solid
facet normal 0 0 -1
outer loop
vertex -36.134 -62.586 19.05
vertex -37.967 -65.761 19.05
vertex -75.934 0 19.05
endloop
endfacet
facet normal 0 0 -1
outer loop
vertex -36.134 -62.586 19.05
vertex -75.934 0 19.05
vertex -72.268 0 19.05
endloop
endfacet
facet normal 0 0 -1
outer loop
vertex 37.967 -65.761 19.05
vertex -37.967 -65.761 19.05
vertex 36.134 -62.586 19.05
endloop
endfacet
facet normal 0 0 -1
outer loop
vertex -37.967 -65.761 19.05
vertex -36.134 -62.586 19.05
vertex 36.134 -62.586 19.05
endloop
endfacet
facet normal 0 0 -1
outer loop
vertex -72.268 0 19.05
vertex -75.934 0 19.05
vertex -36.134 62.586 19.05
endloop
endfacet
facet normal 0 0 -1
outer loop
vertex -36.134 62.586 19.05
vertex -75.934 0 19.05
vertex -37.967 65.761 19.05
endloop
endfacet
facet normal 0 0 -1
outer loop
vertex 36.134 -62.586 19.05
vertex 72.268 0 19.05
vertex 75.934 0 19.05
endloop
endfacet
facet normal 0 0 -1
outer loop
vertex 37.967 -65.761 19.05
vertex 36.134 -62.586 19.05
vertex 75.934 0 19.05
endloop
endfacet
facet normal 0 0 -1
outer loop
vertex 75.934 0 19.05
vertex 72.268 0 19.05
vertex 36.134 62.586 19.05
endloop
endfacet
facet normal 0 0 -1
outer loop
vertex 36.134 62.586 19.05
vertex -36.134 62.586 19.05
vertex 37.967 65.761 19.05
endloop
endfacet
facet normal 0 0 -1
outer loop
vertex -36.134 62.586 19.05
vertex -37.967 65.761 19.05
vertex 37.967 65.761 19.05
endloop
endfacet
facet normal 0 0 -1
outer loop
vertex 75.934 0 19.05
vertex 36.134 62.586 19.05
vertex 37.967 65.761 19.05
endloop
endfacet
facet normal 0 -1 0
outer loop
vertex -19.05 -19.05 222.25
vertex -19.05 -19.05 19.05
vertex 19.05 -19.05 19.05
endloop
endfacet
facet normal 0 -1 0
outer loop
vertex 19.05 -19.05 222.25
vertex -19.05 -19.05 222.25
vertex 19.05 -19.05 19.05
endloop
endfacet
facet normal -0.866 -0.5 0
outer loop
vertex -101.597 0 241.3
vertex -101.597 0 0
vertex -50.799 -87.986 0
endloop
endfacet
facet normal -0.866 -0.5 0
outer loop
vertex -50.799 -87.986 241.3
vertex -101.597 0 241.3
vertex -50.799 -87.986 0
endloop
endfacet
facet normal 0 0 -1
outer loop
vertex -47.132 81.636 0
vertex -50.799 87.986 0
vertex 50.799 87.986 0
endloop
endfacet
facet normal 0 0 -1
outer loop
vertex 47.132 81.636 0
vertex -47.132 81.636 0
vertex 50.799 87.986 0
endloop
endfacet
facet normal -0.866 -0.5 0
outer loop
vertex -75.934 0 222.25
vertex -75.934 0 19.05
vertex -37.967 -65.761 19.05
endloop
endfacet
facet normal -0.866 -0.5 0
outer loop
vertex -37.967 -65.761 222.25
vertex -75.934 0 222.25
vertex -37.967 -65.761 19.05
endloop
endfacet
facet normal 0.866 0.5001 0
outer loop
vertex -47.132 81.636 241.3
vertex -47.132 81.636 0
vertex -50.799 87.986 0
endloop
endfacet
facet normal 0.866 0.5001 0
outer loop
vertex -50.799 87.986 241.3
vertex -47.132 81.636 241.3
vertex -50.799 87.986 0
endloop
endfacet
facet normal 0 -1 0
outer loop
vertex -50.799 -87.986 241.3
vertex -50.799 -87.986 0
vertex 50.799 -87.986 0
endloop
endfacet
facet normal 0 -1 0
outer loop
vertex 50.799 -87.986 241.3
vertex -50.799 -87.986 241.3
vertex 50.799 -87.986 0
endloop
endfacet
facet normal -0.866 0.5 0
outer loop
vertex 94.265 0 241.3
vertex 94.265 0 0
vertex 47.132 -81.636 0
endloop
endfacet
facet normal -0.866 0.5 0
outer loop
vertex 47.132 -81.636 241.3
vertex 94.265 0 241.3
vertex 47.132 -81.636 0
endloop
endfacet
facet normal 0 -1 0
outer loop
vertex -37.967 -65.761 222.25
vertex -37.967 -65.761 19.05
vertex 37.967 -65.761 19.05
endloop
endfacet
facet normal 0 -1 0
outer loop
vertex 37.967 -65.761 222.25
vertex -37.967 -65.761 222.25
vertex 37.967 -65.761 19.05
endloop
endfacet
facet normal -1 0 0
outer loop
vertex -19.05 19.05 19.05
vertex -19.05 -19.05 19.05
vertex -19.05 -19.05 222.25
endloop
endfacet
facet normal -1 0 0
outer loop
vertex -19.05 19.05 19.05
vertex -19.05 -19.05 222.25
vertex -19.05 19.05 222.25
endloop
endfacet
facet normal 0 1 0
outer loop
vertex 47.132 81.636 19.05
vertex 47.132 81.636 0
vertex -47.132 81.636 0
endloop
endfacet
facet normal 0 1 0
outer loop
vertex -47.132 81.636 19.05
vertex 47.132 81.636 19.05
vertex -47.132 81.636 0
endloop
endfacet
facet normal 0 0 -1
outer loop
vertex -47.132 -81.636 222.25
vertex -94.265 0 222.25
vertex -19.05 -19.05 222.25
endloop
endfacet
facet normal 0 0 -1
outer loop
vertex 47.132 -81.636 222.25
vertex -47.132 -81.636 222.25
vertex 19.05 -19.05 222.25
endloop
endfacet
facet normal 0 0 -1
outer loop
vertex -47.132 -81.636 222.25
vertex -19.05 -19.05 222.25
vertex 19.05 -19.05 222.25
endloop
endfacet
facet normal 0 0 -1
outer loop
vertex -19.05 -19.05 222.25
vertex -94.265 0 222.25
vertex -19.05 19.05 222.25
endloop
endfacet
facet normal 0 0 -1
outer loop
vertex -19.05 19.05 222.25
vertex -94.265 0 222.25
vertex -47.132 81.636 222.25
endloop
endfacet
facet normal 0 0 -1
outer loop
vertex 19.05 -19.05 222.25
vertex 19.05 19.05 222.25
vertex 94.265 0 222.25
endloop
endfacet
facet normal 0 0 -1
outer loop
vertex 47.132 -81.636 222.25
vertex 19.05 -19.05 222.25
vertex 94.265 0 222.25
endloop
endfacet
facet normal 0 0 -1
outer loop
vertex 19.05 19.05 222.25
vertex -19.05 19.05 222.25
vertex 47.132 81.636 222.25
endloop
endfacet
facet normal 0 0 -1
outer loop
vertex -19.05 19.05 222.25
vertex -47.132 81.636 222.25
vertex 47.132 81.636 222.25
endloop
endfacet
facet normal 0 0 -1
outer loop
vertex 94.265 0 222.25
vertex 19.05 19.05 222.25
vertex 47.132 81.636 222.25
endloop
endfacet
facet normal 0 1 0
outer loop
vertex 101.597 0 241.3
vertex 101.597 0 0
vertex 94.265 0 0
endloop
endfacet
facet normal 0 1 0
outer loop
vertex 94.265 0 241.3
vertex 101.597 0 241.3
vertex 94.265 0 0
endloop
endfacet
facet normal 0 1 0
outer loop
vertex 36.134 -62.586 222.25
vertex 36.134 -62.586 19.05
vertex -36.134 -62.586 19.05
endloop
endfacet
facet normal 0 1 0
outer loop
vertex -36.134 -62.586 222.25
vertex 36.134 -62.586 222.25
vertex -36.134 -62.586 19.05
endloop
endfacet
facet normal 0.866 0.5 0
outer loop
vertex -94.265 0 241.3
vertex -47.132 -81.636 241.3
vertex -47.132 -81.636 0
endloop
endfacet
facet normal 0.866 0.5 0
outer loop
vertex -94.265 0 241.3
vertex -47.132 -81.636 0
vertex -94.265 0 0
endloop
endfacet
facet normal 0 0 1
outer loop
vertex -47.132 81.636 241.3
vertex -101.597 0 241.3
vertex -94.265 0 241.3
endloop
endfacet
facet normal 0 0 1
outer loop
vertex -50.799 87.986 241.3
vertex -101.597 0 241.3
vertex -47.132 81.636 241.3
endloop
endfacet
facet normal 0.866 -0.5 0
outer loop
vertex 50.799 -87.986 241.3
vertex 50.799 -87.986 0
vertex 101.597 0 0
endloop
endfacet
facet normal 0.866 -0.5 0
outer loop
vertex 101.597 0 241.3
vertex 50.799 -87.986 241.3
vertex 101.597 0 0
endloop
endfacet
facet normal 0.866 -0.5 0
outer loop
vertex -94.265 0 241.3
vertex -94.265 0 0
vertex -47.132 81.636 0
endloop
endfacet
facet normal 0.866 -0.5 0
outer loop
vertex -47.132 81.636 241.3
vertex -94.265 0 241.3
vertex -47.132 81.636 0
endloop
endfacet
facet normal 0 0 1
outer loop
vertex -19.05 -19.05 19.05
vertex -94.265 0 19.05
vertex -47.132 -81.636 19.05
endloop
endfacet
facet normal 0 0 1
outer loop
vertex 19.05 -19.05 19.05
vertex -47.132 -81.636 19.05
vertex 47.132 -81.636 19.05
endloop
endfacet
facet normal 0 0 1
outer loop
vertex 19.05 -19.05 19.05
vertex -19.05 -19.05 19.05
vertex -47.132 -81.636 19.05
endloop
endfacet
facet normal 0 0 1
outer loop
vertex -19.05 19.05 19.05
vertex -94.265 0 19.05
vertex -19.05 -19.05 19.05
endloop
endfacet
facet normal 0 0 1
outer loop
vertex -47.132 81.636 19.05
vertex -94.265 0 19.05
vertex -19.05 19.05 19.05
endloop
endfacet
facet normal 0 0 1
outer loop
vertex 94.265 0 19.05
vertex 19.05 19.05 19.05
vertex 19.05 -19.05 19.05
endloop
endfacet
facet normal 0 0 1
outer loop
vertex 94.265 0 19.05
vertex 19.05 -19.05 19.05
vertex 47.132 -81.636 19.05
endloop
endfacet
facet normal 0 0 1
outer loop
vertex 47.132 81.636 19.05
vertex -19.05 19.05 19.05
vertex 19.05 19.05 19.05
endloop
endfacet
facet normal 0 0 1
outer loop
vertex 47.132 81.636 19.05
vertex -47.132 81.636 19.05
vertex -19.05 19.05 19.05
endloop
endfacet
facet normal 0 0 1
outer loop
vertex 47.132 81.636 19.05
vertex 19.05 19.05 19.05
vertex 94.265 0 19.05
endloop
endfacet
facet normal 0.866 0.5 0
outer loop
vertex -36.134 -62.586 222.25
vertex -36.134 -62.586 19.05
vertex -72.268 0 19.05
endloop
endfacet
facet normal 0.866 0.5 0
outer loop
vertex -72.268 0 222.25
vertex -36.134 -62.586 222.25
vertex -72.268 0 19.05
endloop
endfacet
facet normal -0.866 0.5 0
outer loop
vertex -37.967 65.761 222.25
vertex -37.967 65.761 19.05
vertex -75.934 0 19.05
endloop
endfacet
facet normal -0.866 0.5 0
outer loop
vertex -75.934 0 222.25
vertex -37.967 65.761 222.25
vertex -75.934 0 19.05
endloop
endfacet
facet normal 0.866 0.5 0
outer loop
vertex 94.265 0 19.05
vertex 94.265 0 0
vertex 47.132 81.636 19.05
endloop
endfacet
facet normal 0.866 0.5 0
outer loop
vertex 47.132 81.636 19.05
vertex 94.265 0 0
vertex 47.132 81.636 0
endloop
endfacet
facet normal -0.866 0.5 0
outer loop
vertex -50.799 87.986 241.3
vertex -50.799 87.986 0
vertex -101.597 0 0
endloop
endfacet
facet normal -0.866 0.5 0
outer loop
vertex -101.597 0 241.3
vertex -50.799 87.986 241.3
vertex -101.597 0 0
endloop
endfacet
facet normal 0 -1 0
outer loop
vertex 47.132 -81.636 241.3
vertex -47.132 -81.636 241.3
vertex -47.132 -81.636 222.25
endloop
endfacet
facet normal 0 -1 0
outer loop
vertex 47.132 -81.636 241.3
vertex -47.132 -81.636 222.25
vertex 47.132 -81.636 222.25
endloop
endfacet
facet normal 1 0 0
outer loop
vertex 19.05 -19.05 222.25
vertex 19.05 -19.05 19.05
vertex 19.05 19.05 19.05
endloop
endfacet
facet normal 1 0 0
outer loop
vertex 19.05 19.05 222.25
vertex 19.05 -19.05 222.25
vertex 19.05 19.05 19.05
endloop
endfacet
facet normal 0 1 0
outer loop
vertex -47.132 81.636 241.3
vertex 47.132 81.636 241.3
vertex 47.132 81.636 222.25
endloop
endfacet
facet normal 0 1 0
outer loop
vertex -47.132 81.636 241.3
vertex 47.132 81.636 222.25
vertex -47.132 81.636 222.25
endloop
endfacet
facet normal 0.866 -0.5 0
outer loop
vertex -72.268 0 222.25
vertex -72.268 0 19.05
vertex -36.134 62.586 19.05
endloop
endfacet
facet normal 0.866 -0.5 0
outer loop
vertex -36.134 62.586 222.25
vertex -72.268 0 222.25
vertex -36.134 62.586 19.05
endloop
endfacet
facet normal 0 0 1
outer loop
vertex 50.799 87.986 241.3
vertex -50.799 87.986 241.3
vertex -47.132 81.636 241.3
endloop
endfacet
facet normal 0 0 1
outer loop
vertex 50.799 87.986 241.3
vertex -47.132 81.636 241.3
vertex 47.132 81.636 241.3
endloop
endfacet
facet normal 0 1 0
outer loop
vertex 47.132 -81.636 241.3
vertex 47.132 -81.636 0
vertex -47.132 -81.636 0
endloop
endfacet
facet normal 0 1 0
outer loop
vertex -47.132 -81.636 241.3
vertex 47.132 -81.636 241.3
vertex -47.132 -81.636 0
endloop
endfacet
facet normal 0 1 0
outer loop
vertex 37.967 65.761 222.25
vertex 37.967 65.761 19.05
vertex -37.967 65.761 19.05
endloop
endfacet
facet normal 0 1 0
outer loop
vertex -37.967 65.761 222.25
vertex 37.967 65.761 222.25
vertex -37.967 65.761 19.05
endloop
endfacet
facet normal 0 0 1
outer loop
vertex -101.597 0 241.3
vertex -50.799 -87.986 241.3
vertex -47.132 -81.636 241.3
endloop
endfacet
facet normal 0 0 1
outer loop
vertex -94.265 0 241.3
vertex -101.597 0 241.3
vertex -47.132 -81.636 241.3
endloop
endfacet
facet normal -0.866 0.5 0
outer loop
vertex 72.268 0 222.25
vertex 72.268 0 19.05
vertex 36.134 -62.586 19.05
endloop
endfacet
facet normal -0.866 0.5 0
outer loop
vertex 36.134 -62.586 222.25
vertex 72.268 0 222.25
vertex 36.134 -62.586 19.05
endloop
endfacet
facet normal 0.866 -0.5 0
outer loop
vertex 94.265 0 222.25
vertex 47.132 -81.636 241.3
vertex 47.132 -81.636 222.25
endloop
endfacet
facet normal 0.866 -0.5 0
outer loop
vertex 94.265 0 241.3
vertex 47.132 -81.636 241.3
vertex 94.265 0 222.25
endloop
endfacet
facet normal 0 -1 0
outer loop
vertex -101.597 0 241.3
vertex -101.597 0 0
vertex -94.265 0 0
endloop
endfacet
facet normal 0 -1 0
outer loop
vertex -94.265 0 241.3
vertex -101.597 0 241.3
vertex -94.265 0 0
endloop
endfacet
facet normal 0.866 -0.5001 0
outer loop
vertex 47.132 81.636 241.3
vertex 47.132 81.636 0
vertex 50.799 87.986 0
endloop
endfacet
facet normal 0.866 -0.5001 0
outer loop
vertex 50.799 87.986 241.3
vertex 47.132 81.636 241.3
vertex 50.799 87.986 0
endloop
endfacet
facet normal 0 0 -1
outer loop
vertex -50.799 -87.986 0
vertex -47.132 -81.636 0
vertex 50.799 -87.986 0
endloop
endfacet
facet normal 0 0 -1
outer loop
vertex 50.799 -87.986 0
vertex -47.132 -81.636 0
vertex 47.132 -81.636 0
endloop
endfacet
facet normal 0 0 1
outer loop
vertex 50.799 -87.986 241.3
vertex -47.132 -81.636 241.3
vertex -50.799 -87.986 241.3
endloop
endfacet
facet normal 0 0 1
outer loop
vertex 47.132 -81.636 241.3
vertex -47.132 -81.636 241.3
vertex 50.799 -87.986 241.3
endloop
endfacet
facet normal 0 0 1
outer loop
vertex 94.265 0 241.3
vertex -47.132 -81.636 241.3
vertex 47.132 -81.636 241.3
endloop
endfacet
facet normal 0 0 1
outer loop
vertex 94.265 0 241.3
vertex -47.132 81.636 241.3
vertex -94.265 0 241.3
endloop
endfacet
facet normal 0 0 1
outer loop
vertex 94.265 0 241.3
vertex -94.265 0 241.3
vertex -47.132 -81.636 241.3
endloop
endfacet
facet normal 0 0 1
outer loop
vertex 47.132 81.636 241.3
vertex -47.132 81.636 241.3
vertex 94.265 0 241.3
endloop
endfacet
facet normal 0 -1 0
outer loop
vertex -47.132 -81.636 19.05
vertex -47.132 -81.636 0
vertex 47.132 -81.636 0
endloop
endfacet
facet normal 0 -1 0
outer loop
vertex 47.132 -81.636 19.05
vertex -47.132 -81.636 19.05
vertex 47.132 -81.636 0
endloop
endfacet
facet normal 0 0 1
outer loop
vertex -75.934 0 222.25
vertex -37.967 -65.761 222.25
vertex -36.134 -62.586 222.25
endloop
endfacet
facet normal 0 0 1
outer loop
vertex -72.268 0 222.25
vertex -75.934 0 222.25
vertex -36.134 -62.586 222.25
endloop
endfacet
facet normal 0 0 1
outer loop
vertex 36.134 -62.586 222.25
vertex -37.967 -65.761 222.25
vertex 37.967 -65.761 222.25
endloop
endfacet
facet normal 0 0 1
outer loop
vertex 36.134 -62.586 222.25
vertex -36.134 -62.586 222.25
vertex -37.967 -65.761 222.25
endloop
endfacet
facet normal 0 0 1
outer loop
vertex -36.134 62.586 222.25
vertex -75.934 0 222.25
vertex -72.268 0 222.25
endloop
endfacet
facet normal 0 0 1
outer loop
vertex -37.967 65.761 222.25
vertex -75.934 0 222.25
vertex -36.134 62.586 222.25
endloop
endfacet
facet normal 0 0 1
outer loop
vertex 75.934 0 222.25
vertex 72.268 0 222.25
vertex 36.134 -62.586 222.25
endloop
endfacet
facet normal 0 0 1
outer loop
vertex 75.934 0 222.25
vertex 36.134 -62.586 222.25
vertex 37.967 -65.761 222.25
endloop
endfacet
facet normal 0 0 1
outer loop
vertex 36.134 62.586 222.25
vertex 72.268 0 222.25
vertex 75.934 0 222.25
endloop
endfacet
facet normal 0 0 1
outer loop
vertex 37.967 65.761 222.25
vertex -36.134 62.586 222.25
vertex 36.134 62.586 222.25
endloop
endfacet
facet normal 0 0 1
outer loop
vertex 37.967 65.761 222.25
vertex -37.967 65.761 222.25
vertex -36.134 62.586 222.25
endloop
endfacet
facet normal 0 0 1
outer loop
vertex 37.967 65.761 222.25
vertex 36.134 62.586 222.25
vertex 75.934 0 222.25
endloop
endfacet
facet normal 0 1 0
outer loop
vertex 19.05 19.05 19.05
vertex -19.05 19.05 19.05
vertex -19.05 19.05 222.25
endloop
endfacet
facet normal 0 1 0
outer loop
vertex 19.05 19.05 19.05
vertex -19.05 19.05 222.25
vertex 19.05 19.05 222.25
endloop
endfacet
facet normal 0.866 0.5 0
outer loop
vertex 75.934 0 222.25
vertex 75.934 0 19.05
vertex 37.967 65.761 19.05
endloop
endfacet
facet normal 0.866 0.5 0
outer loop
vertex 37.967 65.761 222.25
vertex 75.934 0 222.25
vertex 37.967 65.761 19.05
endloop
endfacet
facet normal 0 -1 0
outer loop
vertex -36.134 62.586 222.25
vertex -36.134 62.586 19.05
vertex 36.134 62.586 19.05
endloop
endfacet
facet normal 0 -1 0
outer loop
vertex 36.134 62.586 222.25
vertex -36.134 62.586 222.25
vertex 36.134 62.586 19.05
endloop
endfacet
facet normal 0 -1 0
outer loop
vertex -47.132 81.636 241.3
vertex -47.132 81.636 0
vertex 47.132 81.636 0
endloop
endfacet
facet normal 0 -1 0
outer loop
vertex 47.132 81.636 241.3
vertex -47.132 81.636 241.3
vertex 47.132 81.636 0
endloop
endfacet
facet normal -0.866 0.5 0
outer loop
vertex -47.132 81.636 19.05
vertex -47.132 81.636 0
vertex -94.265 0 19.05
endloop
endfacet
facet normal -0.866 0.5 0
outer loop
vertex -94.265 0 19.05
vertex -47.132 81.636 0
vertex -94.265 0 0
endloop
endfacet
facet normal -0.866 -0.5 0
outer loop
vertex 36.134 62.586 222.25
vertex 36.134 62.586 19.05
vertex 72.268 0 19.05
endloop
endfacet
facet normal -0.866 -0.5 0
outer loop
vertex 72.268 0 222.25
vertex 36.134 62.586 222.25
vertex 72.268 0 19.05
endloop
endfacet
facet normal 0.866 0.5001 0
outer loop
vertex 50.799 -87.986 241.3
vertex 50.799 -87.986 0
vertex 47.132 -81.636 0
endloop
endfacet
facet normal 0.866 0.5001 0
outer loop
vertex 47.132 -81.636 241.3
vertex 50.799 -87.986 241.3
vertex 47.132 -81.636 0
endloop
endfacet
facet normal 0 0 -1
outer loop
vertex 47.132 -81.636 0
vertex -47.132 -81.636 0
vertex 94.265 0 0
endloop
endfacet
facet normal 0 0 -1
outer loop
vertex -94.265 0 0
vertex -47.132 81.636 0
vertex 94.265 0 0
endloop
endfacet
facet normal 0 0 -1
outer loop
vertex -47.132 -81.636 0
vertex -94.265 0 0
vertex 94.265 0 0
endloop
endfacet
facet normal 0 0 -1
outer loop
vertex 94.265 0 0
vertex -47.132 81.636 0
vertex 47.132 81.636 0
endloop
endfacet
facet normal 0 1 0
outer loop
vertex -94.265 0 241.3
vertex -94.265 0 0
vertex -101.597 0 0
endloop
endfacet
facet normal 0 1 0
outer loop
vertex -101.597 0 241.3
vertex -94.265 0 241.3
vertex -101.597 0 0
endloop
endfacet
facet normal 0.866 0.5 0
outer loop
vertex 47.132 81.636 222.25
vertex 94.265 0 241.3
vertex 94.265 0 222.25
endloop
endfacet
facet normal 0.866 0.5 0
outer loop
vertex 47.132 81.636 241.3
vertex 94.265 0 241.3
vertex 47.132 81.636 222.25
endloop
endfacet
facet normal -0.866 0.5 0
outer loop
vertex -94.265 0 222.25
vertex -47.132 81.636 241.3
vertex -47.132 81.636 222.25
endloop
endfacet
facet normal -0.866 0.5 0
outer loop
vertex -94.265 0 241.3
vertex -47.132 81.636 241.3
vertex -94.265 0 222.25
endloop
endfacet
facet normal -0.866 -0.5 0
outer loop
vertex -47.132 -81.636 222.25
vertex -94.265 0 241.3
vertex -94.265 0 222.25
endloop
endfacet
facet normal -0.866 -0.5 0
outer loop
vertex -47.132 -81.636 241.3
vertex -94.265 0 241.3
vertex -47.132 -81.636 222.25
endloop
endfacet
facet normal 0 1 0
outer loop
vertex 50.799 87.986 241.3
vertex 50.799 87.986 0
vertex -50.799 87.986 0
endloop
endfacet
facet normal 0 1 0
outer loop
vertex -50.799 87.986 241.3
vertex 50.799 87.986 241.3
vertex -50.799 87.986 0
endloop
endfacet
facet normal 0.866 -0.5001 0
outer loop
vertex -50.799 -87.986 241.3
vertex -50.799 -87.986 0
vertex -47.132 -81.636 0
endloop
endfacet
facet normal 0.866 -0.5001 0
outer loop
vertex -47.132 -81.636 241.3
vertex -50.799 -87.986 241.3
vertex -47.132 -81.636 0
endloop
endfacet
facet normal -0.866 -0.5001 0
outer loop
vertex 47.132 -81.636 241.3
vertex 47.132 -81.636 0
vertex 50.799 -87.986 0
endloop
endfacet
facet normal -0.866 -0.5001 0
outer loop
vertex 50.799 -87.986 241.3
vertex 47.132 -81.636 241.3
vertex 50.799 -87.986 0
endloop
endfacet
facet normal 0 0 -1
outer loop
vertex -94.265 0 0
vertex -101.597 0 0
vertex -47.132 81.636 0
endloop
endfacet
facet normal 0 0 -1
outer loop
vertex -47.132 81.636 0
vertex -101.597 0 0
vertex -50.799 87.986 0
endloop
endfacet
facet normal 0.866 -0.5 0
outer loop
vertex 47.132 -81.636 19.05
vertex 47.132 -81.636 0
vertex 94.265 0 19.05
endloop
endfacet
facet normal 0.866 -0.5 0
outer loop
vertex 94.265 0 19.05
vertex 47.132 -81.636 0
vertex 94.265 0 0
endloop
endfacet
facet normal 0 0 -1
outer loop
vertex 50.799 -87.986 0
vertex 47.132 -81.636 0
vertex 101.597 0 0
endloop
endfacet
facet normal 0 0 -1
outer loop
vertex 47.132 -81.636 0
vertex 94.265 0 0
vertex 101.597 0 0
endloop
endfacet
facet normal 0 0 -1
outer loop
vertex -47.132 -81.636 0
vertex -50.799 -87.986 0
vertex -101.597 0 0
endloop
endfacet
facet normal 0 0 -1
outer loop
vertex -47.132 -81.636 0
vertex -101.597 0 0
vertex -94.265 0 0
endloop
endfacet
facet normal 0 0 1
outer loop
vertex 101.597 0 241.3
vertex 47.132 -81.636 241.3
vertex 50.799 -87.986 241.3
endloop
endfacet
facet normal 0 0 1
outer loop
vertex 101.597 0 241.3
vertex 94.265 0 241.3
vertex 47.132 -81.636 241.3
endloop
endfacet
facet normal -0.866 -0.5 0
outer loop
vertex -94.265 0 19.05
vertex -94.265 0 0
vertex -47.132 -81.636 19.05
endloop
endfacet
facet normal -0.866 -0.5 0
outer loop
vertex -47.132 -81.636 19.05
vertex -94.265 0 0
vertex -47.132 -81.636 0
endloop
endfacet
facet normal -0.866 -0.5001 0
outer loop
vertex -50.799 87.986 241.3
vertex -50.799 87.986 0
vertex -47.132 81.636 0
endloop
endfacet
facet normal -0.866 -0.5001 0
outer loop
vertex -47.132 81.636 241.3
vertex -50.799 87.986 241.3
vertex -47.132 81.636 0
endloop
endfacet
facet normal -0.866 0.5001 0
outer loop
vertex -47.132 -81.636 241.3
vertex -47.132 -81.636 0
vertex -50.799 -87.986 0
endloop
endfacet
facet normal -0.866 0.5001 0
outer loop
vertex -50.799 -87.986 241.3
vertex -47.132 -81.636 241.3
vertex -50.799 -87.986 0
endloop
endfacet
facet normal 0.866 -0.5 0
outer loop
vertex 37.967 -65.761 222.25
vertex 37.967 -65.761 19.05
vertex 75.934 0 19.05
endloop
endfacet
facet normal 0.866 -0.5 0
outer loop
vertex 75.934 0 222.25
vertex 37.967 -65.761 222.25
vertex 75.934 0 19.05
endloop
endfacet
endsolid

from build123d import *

# Parameters (mm, degrees)
F1_DEPTH  = 19.05
F2_W      = 38.1
F2_H      = 38.1
F3_DEPTH  = 203.2
F6_DEPTH  = 241.3
F7_DEPTH  = 241.3
F8_DEPTH  = 241.3
F9_DEPTH  = 241.3
F10_DEPTH = 241.3
F12_DEPTH = 203.2


with BuildPart() as f1:
    # F0 (on Top) → F1 (new body)
    with BuildSketch(Plane.XY):
        Polygon((-47.1323356355, -81.6356), (47.1323356355, -81.6356), (94.2646712709, 0), (47.1323356355, 81.6356), (-47.1323356355, 81.6356), (-94.2646712709, 0), align=None)
    extrude(amount=F1_DEPTH)



with BuildPart() as f3:
    # F2 (on face) → F3 (new body)
    with BuildSketch(Plane.XY.offset(19.05)):
        Rectangle(F2_W, F2_H)
    extrude(amount=F3_DEPTH)


with BuildPart() as f1_1:
    add(f1.part)

    add(f3.part)  # F5 merges F3
    # F5: F1 across plane
    add(f1.part.mirror(Plane.XY.offset(120.65)))


with BuildPart() as f6:
    # F0 (on Top) → F6 (new body, through all)
    with BuildSketch(Plane.XY):
        Polygon((47.1323356355, 81.6356), (50.7985098448, 87.9856), (-50.7985098448, 87.9856), (-47.1323356355, 81.6356), align=None)
    extrude(amount=F6_DEPTH)


with BuildPart() as f7:
    # F0 (on Top) → F7 (new body, through all)
    with BuildSketch(Plane.XY):
        Polygon((-50.7985098448, 87.9856), (-101.5970196896, 0), (-94.2646712709, 0), (-47.1323356355, 81.6356), align=None)
    extrude(amount=F7_DEPTH)


with BuildPart() as f8:
    # F0 (on Top) → F8 (new body, through all)
    with BuildSketch(Plane.XY):
        Polygon((-101.5970196896, 0), (-50.7985098448, -87.9856), (-47.1323356355, -81.6356), (-94.2646712709, 0), align=None)
    extrude(amount=F8_DEPTH)


with BuildPart() as f9:
    # F0 (on Top) → F9 (new body, through all)
    with BuildSketch(Plane.XY):
        Polygon((-50.7985098448, -87.9856), (50.7985098448, -87.9856), (47.1323356355, -81.6356), (-47.1323356355, -81.6356), align=None)
    extrude(amount=F9_DEPTH)


with BuildPart() as f10:
    # F0 (on Top) → F10 (new body, through all)
    with BuildSketch(Plane.XY):
        Polygon((47.1323356355, -81.6356), (50.7985098448, -87.9856), (101.5970196896, 0), (94.2646712709, 0), align=None)
    extrude(amount=F10_DEPTH)


with BuildPart() as f12:
    # F11 (on face) → F12 (new body, through all)
    with BuildSketch(Plane.XY.offset(19.05)):
        Polygon((-75.9337987201, 0), (-37.96689936, -65.7605986974), (37.96689936, -65.7605986974), (75.9337987201, 0), (37.96689936, 65.7605986974), (-37.96689936, 65.7605986974), align=None)
        Polygon((36.1338132325, -62.5856003899), (-36.1338132325, -62.5856003899), (-72.267626465, 0), (-36.1338132325, 62.5856003899), (36.1338132325, 62.5856003899), (72.267626465, 0), align=None, mode=Mode.SUBTRACT)
    extrude(amount=F12_DEPTH)


solid = Compound([f1_1.part, f6.part, f7.part, f8.part, f9.part, f10.part, f12.part])
